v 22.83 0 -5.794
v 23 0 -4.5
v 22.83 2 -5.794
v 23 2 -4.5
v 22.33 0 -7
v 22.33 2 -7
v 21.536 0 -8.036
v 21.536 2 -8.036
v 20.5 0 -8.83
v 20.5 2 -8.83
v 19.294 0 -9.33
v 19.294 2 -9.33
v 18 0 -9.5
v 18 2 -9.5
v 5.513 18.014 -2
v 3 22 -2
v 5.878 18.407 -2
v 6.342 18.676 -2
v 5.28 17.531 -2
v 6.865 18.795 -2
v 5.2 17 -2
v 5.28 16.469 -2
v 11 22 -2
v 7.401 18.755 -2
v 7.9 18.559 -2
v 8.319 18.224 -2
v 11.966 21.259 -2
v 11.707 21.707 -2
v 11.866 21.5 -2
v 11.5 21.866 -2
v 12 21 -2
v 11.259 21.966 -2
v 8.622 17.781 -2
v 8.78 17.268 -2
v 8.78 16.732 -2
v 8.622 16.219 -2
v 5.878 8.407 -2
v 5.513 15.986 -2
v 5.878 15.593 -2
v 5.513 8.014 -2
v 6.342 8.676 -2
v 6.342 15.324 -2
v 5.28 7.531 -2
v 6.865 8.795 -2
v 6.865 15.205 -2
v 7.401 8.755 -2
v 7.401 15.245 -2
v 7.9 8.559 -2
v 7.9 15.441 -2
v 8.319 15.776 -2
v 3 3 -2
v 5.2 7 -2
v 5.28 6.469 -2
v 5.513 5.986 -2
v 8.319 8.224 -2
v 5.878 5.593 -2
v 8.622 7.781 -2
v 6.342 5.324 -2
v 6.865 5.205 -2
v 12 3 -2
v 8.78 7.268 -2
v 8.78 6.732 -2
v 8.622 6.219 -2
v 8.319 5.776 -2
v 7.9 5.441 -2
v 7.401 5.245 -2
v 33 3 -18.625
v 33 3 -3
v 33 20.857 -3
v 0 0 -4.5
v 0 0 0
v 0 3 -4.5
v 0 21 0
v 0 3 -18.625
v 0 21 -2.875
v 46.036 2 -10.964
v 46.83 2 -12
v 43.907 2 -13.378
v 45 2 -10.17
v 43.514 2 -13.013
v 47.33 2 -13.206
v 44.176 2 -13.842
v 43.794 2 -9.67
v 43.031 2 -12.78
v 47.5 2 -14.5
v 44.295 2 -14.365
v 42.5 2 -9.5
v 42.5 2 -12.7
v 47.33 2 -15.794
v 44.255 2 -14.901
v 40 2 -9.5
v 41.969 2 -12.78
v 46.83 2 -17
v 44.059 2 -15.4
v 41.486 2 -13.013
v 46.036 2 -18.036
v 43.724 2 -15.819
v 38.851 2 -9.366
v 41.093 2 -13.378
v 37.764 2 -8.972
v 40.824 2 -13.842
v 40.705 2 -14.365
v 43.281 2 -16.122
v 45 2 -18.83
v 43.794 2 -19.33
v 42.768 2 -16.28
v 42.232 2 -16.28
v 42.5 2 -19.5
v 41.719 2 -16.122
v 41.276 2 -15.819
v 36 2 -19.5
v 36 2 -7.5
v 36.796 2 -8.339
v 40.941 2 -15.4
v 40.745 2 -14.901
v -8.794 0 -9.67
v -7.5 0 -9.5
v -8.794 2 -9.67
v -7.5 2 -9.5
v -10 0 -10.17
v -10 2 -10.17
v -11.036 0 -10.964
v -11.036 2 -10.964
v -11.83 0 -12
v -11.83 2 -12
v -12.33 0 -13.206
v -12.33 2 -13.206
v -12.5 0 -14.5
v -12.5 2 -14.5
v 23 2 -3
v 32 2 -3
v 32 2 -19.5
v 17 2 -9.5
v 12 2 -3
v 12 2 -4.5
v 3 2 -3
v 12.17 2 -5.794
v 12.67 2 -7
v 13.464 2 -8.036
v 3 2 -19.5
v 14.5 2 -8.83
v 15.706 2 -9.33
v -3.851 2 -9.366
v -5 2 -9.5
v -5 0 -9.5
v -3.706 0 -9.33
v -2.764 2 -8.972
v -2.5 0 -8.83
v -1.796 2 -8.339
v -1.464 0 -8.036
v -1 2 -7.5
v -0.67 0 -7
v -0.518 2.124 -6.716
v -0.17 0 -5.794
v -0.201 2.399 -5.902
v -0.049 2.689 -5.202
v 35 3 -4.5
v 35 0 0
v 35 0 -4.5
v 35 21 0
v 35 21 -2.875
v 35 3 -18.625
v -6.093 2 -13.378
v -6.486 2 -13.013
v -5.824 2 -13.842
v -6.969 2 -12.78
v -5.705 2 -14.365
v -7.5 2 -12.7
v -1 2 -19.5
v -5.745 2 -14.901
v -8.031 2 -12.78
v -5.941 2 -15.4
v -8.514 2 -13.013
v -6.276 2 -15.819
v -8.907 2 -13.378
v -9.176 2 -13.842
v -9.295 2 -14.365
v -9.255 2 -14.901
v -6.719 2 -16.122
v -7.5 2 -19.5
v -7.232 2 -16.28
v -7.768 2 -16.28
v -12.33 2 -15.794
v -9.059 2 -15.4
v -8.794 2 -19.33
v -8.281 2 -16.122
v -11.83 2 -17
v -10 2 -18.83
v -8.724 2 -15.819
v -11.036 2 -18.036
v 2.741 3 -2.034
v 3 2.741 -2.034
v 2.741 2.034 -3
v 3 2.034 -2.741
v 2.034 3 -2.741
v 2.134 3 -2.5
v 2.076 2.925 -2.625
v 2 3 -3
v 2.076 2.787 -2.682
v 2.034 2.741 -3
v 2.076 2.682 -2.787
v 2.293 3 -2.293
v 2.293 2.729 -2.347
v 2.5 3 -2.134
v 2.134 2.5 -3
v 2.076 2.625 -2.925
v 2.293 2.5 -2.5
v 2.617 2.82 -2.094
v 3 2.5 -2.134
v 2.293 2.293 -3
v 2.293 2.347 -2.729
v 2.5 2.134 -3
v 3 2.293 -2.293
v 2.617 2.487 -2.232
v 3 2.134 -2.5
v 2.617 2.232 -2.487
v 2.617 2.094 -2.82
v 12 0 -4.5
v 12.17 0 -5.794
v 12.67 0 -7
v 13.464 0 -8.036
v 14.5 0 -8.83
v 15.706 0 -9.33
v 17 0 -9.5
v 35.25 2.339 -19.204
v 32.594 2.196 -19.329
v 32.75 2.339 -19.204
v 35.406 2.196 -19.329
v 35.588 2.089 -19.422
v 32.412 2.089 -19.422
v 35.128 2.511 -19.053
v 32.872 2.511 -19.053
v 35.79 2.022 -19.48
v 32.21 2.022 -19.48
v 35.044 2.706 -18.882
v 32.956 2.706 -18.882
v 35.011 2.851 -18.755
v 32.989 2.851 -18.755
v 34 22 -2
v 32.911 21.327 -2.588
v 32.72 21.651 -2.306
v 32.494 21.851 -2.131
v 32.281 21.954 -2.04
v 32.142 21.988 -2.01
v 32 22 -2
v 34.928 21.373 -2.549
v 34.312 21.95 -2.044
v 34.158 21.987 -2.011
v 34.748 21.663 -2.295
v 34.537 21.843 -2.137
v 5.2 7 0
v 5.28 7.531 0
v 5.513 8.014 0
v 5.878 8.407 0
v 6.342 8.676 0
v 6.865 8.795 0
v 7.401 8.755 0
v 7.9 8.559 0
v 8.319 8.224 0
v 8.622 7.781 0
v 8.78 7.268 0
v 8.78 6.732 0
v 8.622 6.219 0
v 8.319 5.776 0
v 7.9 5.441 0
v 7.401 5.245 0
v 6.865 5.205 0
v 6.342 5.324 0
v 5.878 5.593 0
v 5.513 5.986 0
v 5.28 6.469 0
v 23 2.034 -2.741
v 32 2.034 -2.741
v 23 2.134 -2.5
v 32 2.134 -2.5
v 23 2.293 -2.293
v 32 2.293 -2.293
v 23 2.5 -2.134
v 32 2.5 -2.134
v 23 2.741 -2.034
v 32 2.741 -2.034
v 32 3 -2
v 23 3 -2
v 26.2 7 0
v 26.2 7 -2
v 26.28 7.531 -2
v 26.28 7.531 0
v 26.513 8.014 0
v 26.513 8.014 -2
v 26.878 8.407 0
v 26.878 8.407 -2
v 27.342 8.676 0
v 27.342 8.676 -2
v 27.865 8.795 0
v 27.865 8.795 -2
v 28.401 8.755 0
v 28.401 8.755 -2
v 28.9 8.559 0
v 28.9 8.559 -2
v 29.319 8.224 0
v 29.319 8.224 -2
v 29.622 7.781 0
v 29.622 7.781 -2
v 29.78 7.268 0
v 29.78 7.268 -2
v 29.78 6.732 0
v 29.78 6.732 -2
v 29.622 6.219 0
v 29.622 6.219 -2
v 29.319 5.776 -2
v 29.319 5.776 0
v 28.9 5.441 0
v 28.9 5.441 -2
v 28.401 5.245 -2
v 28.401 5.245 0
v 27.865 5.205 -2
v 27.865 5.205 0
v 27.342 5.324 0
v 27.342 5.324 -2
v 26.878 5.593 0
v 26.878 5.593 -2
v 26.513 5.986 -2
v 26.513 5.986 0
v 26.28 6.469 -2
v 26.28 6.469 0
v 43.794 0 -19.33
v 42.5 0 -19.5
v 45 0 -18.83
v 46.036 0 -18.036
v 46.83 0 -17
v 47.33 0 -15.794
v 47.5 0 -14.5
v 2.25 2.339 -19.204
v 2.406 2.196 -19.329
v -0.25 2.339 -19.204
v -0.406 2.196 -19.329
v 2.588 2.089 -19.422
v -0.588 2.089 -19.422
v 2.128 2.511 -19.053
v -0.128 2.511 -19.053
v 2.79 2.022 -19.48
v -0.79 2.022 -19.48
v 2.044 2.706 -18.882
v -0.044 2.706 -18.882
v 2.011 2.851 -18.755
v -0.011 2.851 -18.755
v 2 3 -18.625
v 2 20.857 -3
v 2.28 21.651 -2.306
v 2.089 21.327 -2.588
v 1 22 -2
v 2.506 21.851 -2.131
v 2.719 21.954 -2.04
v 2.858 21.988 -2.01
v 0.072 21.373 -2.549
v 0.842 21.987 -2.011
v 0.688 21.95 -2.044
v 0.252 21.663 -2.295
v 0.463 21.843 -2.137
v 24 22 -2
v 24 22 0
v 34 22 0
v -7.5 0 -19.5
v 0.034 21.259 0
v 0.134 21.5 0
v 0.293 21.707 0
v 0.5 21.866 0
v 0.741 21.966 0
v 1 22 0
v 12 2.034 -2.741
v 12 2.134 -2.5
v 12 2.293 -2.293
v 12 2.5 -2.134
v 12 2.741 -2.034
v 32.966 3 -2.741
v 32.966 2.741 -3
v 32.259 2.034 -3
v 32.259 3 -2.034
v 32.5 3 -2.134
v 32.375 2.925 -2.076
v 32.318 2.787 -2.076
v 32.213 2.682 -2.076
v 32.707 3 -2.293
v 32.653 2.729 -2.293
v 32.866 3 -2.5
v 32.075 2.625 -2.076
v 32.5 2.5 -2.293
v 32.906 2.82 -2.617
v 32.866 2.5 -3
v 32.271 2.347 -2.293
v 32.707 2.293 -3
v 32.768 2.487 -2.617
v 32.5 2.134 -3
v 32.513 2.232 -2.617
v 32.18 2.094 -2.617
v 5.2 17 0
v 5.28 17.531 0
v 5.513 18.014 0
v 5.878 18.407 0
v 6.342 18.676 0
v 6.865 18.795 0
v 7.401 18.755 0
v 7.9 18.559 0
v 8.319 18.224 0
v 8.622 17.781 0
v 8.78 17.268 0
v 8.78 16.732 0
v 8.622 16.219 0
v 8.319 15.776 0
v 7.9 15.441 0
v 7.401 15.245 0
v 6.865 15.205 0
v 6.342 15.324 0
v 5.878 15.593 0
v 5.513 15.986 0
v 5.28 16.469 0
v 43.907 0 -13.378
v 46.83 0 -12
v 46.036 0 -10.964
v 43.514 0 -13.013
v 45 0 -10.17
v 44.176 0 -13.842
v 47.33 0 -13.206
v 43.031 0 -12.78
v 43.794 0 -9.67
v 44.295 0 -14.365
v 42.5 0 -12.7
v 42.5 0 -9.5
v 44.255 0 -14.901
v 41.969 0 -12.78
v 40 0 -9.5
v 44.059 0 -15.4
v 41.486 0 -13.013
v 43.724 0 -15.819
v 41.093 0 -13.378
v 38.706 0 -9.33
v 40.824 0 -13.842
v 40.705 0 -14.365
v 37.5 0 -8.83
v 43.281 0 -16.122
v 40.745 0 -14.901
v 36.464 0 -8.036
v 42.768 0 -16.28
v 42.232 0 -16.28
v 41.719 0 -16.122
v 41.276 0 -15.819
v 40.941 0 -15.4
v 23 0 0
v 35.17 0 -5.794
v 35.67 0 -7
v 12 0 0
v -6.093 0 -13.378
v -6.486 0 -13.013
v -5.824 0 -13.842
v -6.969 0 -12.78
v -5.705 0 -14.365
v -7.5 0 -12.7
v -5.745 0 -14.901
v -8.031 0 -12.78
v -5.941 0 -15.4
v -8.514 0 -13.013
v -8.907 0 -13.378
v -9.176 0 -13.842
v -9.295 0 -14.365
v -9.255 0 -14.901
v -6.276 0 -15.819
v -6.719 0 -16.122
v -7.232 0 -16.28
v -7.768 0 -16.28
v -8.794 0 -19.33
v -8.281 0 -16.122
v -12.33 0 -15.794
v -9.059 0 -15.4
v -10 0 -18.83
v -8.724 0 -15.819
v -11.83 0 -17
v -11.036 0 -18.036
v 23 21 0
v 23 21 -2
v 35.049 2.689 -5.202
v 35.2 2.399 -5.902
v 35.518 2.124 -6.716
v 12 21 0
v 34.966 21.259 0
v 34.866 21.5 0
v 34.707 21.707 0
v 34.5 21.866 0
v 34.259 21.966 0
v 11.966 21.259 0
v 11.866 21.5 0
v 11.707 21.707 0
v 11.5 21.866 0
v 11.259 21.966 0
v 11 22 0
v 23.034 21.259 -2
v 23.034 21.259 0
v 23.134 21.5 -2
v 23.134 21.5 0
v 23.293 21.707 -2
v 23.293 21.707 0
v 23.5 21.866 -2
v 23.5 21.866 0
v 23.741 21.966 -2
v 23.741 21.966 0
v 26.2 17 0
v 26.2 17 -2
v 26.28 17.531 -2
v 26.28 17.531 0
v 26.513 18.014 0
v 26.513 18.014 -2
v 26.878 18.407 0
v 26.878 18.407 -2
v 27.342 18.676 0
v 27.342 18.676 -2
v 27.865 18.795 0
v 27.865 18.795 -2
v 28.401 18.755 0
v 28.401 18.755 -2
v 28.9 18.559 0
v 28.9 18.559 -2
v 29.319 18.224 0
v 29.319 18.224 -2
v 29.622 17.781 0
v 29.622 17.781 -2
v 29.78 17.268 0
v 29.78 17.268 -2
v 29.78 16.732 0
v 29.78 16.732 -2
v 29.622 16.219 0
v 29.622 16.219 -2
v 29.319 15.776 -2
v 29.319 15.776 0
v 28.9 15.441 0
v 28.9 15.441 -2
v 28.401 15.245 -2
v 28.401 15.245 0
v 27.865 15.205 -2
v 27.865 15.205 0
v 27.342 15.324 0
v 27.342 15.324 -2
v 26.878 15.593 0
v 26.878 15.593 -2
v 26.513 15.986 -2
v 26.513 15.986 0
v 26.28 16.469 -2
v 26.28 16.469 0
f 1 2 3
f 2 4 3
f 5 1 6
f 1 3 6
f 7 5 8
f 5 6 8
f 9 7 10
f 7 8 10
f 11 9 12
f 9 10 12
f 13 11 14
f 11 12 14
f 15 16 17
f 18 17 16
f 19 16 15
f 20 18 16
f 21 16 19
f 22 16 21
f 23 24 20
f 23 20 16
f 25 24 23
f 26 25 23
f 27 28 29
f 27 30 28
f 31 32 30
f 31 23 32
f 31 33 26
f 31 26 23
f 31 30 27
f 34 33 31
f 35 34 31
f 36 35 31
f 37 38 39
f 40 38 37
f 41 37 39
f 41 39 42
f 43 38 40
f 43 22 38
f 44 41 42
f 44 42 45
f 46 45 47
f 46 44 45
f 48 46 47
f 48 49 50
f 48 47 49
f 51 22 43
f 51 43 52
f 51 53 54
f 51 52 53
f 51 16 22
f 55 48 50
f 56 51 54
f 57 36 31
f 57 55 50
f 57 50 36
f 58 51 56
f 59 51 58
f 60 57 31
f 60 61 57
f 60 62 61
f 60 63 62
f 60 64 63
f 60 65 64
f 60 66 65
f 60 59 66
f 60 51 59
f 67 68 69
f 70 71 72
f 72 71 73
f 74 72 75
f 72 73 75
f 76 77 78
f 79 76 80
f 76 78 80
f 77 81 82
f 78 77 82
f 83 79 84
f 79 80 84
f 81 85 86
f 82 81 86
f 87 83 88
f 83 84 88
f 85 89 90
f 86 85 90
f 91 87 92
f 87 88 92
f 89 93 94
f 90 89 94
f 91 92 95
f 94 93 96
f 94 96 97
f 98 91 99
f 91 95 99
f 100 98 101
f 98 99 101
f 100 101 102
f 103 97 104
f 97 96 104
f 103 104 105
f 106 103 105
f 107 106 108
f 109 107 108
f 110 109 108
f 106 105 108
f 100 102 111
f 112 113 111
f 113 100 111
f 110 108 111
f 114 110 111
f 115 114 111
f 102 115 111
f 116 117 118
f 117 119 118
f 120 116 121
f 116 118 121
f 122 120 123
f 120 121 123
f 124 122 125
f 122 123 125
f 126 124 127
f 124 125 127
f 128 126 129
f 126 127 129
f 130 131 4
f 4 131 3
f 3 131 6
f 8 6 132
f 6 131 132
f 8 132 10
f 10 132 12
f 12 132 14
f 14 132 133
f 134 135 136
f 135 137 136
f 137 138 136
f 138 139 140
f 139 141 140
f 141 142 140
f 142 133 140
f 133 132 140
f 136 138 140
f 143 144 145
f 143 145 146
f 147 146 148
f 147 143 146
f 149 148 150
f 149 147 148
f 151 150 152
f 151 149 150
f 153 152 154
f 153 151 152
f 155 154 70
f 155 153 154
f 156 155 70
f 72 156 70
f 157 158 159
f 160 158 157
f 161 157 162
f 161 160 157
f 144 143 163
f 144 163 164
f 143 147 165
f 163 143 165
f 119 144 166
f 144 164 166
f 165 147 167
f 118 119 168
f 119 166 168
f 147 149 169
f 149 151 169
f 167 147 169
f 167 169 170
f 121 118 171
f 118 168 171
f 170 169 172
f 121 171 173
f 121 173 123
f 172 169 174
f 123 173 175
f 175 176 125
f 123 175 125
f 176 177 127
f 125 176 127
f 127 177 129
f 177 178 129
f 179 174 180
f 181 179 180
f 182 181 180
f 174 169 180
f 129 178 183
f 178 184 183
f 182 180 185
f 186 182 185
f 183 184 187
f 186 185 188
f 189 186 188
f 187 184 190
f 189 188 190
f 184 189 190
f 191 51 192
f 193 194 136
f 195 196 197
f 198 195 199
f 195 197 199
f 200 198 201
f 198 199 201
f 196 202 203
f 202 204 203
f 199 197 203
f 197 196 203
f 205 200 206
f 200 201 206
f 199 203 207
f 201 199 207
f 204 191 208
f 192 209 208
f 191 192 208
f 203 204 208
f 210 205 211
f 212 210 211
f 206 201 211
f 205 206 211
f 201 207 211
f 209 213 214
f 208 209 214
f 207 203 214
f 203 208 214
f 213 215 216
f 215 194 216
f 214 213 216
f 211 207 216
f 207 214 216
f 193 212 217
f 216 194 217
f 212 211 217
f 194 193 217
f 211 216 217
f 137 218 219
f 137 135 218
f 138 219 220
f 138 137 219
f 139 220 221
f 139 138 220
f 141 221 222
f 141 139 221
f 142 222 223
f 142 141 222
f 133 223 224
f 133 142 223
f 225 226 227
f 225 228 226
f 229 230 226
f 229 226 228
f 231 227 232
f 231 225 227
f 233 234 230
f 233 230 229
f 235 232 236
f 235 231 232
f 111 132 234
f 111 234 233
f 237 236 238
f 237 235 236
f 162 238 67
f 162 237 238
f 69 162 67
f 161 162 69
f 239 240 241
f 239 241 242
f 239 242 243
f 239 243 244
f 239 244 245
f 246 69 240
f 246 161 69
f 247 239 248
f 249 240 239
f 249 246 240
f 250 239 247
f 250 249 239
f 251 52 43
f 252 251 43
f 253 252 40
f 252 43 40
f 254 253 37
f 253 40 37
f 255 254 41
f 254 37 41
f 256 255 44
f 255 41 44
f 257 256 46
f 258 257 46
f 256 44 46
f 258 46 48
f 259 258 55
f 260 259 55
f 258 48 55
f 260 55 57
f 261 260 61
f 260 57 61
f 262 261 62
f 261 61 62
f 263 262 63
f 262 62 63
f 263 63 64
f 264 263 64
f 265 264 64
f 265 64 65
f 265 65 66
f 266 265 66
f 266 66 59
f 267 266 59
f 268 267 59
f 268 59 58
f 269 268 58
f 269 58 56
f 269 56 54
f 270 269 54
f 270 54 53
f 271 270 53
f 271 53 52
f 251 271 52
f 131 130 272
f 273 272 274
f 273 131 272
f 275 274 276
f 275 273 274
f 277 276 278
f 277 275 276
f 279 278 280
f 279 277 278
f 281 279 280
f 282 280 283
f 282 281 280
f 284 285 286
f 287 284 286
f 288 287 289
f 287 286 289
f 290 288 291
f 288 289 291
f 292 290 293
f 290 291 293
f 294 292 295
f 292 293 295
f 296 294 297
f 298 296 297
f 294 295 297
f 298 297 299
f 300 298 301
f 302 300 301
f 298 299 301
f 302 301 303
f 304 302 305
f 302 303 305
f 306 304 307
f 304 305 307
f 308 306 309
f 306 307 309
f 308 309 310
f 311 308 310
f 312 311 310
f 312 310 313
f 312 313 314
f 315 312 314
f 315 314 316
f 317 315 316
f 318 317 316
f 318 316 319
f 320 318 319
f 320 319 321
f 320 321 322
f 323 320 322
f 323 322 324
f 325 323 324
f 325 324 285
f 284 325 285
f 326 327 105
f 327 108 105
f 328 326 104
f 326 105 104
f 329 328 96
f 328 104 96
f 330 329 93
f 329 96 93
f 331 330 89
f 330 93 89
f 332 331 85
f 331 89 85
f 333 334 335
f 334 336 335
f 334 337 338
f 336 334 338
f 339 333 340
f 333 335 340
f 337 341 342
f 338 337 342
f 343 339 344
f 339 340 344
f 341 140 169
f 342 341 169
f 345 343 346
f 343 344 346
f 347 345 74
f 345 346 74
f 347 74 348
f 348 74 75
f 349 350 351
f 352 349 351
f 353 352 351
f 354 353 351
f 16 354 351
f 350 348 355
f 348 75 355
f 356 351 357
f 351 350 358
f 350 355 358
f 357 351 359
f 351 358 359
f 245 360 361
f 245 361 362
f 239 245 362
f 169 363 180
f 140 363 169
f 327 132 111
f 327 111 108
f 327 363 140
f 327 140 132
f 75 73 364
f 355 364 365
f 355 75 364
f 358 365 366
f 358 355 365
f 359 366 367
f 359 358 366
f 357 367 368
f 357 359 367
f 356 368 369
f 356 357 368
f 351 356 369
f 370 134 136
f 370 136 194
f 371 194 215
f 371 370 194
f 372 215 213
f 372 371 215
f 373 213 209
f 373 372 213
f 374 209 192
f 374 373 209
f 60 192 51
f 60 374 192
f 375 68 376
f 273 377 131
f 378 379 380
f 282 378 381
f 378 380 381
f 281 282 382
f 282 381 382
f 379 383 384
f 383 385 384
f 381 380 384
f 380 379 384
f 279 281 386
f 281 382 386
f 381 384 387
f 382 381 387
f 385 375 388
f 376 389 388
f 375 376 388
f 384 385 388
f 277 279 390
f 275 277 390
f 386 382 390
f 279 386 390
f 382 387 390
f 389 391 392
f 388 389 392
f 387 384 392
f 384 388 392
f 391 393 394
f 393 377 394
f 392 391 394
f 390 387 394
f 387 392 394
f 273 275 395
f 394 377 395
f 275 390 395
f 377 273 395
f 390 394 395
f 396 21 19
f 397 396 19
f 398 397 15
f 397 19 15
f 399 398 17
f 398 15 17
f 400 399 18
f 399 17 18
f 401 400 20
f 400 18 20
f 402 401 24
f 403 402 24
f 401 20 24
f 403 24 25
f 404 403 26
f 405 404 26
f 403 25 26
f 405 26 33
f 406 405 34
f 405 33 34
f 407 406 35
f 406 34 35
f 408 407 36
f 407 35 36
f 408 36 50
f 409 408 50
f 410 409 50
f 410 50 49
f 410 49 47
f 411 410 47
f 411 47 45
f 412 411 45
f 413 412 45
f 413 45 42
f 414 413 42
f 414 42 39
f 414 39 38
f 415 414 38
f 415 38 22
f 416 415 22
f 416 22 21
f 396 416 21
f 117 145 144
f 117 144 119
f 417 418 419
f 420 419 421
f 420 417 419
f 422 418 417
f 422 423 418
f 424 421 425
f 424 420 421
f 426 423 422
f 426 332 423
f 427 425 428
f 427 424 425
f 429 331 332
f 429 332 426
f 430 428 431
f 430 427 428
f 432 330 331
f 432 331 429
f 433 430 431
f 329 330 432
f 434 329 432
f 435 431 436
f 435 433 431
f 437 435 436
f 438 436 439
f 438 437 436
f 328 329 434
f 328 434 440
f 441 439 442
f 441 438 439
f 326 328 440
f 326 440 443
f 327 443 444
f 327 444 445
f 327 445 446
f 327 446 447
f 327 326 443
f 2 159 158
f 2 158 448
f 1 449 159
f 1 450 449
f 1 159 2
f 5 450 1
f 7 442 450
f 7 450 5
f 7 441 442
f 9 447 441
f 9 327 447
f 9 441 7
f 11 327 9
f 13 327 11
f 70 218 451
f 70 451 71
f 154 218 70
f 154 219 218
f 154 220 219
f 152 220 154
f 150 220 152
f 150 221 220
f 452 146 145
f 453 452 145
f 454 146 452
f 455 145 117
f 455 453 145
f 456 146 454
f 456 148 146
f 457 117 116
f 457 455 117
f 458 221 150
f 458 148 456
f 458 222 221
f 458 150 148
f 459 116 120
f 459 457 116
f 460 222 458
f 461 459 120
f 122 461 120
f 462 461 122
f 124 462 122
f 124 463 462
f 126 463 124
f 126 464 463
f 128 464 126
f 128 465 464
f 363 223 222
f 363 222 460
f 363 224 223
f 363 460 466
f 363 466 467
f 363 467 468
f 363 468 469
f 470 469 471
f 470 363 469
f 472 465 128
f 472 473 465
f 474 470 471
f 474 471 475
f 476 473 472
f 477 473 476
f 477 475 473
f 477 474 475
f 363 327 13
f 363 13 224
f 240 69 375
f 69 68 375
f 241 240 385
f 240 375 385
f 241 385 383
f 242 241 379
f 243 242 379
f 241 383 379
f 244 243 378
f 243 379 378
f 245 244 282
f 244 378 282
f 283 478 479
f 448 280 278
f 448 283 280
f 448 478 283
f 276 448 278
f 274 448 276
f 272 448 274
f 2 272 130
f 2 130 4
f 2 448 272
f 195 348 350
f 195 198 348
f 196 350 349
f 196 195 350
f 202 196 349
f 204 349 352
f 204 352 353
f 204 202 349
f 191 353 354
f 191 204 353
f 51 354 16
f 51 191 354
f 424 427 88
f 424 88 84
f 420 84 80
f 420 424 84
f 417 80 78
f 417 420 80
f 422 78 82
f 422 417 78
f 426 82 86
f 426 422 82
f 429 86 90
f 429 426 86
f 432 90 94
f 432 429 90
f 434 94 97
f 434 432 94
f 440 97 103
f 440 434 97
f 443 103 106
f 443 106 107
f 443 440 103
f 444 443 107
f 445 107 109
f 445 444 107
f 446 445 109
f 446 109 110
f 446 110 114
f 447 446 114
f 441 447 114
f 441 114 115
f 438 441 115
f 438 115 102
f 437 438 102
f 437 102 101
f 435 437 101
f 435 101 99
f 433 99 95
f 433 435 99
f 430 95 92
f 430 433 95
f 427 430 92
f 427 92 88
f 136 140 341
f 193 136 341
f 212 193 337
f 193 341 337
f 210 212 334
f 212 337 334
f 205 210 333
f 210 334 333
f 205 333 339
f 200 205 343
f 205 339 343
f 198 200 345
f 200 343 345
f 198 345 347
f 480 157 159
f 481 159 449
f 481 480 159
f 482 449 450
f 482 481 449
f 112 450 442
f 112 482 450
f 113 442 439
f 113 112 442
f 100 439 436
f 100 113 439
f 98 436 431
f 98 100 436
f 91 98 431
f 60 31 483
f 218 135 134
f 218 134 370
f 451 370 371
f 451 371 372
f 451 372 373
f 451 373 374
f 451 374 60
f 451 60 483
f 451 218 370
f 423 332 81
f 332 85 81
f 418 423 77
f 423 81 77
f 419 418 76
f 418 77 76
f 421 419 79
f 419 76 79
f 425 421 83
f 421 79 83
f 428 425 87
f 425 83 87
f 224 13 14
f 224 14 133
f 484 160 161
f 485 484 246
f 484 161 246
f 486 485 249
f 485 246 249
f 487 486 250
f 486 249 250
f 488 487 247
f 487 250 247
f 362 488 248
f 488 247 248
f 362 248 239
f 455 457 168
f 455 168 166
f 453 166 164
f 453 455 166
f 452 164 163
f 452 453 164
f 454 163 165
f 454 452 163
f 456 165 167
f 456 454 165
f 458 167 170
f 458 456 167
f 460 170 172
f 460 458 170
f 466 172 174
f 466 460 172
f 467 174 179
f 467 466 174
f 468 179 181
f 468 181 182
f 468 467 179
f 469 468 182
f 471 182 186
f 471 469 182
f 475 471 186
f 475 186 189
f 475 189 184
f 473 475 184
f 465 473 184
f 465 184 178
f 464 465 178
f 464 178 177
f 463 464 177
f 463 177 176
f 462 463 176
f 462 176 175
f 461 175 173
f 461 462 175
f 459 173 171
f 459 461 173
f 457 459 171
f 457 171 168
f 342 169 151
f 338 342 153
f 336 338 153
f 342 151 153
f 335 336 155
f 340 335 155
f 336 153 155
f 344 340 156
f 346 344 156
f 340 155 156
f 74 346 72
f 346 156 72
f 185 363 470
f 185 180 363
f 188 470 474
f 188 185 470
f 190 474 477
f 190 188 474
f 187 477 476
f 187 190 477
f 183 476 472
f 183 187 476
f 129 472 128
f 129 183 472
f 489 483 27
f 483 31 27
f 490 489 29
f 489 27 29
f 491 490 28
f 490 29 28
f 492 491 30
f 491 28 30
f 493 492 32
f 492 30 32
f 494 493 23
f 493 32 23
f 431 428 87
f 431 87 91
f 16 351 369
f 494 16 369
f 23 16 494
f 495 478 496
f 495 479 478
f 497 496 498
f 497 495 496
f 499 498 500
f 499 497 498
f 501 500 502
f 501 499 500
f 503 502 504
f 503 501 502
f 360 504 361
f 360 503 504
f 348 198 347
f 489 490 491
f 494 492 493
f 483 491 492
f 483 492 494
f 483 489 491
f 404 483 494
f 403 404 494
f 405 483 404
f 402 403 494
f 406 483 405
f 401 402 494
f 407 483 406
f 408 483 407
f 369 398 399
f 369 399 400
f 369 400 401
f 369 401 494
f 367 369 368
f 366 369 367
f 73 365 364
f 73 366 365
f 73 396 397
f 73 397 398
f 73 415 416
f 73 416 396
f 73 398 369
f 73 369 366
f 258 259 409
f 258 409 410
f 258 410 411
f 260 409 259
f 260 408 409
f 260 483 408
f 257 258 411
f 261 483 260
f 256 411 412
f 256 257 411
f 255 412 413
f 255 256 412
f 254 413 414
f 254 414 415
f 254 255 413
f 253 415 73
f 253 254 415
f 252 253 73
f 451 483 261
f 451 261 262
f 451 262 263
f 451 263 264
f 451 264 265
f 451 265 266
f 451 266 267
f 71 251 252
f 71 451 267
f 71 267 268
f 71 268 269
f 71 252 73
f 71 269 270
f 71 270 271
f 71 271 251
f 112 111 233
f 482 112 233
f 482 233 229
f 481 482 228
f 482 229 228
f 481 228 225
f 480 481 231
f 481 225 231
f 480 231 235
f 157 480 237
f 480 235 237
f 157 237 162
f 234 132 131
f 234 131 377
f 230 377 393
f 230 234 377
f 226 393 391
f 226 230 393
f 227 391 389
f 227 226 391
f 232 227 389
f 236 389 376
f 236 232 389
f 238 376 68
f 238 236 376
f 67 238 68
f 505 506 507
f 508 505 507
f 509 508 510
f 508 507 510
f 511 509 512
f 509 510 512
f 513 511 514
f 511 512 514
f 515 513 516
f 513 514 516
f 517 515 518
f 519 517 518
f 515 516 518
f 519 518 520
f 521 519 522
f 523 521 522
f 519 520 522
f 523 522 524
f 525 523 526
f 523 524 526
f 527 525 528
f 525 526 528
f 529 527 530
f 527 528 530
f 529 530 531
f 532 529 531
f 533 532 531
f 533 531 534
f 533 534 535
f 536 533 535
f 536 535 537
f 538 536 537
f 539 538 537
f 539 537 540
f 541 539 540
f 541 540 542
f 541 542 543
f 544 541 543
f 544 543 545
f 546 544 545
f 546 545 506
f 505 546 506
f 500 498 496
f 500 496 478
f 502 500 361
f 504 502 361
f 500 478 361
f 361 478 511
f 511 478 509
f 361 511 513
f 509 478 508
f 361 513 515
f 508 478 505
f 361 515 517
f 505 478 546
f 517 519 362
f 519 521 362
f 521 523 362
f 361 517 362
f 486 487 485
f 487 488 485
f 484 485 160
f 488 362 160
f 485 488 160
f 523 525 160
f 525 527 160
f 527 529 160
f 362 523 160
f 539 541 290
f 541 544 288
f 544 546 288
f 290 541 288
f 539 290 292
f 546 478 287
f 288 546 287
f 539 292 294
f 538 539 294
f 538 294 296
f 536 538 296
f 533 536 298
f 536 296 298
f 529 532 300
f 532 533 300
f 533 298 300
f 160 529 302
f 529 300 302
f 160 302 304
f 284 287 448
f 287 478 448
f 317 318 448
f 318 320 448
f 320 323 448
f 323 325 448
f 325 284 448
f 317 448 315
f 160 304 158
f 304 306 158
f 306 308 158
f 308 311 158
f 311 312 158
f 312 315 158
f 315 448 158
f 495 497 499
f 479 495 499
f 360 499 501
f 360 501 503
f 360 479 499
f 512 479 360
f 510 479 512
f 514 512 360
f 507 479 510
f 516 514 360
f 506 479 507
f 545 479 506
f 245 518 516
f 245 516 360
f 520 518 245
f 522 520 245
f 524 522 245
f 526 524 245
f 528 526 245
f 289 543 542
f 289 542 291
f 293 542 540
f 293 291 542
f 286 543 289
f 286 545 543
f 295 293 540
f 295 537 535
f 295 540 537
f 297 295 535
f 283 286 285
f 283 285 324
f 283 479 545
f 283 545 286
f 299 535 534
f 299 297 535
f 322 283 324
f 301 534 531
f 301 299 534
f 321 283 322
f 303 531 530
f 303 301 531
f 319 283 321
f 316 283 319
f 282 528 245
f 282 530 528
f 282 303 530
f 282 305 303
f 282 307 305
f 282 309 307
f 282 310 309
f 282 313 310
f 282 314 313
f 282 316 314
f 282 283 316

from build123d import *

# Parameters (mm, degrees)
SKETCH1_R           = 1.8
BOSS_EXTRUDE1_DEPTH = 2
SKETCH2_W           = 12
SKETCH2_H           = 2
BOSS_EXTRUDE2_DEPTH = 20
SKETCH3_R           = 1.8
CUT_EXTRUDE1_DEPTH  = 56.195108479
BOSS_EXTRUDE3_DEPTH = 2
BOSS_EXTRUDE4_DEPTH = 2
FILLET1_R           = 5
FILLET2_R           = 5
FILLET3_R           = 1
FILLET4_R           = 1


with BuildPart() as part:
    # Sketch1 → Boss-Extrude1 (new body)
    with BuildSketch(Plane(origin=(0, 0, 0), x_dir=(1, 0, 0), z_dir=(0, 1, 0))):
        Polygon((-12.5, 19.5), (47.5, 19.5), (47.5, 9.5), (35, 9.5), (35, 0), (23, 0), (23, 9.5), (12, 9.5), (12, 0), (0, 0), (0, 9.5), (-12.5, 9.5), align=None)
        with Locations(Location((-7.5, 14.5, 0), (0, 0, 270))):
            Circle(SKETCH1_R, mode=Mode.SUBTRACT)
        with Locations(Location((42.5, 14.5, 0), (0, 0, 270))):
            Circle(SKETCH1_R, mode=Mode.SUBTRACT)
    extrude(amount=BOSS_EXTRUDE1_DEPTH)

    # Sketch2 → Boss-Extrude2 (add)
    with BuildSketch(Plane(origin=(0, 2, 0), x_dir=(1, 0, 0), z_dir=(0, 1, 0))):
        with Locations((29, 1)):
            Rectangle(SKETCH2_W, SKETCH2_H)
        with Locations((6, 1)):
            Rectangle(SKETCH2_W, SKETCH2_H)
    extrude(amount=BOSS_EXTRUDE2_DEPTH)

    # Sketch3 → Cut-Extrude1 (cut, through all)
    with BuildSketch(Plane(origin=(0, 0, -2), x_dir=(-1, 0, 0), z_dir=(0, 0, -1))):
        with Locations((-7, 7)):
            Circle(SKETCH3_R)
        with Locations((-7, 17)):
            Circle(SKETCH3_R)
        with Locations((-28, 7)):
            Circle(SKETCH3_R)
        with Locations((-28, 17)):
            Circle(SKETCH3_R)
    extrude(amount=-CUT_EXTRUDE1_DEPTH, mode=Mode.SUBTRACT)

    # Sketch4 → Boss-Extrude3 (add)
    with BuildSketch(Plane.ZY):
        Polygon((-2, 22), (-2, 2), (-19.5, 2), align=None)
    extrude(amount=-BOSS_EXTRUDE3_DEPTH)

    # Sketch5 → Boss-Extrude4 (add)
    with BuildSketch(Plane(origin=(35, 0, 0), x_dir=(0, 0, -1), z_dir=(1, 0, 0))):
        Polygon((2, 22), (2, 2), (19.5, 2), align=None)
    extrude(amount=-BOSS_EXTRUDE4_DEPTH)

    # Fillet1
    fillet1_edges = [part.edges().sort_by_distance(p)[0] for p in [
        (35, 1, -9.5),
        (23, 1, -9.5),
        (12, 1, -9.5),
        (0, 1, -9.5),
    ]]
    fillet(fillet1_edges, radius=FILLET1_R)

    # Fillet2
    fillet2_edges = [part.edges().sort_by_distance(p)[0] for p in [
        (47.5, 1, -9.5),
        (47.5, 1, -19.5),
        (-12.5, 1, -19.5),
        (-12.5, 1, -9.5),
    ]]
    fillet(fillet2_edges, radius=FILLET2_R - 0.0001)  # a hair under: the kernel refuses the full size

    # Fillet3
    fillet3_edges = [part.edges().sort_by_distance(p)[0] for p in [
        (33, 2, -10.75),
        (33, 12, -2),
        (35, 2, -12),
        (7, 2, -2),
        (2, 12, -2),
        (2, 2, -10.75),
        (0, 2, -12),
        (28, 2, -2),
    ]]
    fillet(fillet3_edges, radius=FILLET3_R)

    # Fillet4
    fillet4_edges = [part.edges().sort_by_distance(p)[0] for p in [
        (0, 22, -1),
        (12, 22, -1),
        (23, 22, -1),
        (35, 22, -1),
    ]]
    fillet(fillet4_edges, radius=FILLET4_R)


solid = part.part
